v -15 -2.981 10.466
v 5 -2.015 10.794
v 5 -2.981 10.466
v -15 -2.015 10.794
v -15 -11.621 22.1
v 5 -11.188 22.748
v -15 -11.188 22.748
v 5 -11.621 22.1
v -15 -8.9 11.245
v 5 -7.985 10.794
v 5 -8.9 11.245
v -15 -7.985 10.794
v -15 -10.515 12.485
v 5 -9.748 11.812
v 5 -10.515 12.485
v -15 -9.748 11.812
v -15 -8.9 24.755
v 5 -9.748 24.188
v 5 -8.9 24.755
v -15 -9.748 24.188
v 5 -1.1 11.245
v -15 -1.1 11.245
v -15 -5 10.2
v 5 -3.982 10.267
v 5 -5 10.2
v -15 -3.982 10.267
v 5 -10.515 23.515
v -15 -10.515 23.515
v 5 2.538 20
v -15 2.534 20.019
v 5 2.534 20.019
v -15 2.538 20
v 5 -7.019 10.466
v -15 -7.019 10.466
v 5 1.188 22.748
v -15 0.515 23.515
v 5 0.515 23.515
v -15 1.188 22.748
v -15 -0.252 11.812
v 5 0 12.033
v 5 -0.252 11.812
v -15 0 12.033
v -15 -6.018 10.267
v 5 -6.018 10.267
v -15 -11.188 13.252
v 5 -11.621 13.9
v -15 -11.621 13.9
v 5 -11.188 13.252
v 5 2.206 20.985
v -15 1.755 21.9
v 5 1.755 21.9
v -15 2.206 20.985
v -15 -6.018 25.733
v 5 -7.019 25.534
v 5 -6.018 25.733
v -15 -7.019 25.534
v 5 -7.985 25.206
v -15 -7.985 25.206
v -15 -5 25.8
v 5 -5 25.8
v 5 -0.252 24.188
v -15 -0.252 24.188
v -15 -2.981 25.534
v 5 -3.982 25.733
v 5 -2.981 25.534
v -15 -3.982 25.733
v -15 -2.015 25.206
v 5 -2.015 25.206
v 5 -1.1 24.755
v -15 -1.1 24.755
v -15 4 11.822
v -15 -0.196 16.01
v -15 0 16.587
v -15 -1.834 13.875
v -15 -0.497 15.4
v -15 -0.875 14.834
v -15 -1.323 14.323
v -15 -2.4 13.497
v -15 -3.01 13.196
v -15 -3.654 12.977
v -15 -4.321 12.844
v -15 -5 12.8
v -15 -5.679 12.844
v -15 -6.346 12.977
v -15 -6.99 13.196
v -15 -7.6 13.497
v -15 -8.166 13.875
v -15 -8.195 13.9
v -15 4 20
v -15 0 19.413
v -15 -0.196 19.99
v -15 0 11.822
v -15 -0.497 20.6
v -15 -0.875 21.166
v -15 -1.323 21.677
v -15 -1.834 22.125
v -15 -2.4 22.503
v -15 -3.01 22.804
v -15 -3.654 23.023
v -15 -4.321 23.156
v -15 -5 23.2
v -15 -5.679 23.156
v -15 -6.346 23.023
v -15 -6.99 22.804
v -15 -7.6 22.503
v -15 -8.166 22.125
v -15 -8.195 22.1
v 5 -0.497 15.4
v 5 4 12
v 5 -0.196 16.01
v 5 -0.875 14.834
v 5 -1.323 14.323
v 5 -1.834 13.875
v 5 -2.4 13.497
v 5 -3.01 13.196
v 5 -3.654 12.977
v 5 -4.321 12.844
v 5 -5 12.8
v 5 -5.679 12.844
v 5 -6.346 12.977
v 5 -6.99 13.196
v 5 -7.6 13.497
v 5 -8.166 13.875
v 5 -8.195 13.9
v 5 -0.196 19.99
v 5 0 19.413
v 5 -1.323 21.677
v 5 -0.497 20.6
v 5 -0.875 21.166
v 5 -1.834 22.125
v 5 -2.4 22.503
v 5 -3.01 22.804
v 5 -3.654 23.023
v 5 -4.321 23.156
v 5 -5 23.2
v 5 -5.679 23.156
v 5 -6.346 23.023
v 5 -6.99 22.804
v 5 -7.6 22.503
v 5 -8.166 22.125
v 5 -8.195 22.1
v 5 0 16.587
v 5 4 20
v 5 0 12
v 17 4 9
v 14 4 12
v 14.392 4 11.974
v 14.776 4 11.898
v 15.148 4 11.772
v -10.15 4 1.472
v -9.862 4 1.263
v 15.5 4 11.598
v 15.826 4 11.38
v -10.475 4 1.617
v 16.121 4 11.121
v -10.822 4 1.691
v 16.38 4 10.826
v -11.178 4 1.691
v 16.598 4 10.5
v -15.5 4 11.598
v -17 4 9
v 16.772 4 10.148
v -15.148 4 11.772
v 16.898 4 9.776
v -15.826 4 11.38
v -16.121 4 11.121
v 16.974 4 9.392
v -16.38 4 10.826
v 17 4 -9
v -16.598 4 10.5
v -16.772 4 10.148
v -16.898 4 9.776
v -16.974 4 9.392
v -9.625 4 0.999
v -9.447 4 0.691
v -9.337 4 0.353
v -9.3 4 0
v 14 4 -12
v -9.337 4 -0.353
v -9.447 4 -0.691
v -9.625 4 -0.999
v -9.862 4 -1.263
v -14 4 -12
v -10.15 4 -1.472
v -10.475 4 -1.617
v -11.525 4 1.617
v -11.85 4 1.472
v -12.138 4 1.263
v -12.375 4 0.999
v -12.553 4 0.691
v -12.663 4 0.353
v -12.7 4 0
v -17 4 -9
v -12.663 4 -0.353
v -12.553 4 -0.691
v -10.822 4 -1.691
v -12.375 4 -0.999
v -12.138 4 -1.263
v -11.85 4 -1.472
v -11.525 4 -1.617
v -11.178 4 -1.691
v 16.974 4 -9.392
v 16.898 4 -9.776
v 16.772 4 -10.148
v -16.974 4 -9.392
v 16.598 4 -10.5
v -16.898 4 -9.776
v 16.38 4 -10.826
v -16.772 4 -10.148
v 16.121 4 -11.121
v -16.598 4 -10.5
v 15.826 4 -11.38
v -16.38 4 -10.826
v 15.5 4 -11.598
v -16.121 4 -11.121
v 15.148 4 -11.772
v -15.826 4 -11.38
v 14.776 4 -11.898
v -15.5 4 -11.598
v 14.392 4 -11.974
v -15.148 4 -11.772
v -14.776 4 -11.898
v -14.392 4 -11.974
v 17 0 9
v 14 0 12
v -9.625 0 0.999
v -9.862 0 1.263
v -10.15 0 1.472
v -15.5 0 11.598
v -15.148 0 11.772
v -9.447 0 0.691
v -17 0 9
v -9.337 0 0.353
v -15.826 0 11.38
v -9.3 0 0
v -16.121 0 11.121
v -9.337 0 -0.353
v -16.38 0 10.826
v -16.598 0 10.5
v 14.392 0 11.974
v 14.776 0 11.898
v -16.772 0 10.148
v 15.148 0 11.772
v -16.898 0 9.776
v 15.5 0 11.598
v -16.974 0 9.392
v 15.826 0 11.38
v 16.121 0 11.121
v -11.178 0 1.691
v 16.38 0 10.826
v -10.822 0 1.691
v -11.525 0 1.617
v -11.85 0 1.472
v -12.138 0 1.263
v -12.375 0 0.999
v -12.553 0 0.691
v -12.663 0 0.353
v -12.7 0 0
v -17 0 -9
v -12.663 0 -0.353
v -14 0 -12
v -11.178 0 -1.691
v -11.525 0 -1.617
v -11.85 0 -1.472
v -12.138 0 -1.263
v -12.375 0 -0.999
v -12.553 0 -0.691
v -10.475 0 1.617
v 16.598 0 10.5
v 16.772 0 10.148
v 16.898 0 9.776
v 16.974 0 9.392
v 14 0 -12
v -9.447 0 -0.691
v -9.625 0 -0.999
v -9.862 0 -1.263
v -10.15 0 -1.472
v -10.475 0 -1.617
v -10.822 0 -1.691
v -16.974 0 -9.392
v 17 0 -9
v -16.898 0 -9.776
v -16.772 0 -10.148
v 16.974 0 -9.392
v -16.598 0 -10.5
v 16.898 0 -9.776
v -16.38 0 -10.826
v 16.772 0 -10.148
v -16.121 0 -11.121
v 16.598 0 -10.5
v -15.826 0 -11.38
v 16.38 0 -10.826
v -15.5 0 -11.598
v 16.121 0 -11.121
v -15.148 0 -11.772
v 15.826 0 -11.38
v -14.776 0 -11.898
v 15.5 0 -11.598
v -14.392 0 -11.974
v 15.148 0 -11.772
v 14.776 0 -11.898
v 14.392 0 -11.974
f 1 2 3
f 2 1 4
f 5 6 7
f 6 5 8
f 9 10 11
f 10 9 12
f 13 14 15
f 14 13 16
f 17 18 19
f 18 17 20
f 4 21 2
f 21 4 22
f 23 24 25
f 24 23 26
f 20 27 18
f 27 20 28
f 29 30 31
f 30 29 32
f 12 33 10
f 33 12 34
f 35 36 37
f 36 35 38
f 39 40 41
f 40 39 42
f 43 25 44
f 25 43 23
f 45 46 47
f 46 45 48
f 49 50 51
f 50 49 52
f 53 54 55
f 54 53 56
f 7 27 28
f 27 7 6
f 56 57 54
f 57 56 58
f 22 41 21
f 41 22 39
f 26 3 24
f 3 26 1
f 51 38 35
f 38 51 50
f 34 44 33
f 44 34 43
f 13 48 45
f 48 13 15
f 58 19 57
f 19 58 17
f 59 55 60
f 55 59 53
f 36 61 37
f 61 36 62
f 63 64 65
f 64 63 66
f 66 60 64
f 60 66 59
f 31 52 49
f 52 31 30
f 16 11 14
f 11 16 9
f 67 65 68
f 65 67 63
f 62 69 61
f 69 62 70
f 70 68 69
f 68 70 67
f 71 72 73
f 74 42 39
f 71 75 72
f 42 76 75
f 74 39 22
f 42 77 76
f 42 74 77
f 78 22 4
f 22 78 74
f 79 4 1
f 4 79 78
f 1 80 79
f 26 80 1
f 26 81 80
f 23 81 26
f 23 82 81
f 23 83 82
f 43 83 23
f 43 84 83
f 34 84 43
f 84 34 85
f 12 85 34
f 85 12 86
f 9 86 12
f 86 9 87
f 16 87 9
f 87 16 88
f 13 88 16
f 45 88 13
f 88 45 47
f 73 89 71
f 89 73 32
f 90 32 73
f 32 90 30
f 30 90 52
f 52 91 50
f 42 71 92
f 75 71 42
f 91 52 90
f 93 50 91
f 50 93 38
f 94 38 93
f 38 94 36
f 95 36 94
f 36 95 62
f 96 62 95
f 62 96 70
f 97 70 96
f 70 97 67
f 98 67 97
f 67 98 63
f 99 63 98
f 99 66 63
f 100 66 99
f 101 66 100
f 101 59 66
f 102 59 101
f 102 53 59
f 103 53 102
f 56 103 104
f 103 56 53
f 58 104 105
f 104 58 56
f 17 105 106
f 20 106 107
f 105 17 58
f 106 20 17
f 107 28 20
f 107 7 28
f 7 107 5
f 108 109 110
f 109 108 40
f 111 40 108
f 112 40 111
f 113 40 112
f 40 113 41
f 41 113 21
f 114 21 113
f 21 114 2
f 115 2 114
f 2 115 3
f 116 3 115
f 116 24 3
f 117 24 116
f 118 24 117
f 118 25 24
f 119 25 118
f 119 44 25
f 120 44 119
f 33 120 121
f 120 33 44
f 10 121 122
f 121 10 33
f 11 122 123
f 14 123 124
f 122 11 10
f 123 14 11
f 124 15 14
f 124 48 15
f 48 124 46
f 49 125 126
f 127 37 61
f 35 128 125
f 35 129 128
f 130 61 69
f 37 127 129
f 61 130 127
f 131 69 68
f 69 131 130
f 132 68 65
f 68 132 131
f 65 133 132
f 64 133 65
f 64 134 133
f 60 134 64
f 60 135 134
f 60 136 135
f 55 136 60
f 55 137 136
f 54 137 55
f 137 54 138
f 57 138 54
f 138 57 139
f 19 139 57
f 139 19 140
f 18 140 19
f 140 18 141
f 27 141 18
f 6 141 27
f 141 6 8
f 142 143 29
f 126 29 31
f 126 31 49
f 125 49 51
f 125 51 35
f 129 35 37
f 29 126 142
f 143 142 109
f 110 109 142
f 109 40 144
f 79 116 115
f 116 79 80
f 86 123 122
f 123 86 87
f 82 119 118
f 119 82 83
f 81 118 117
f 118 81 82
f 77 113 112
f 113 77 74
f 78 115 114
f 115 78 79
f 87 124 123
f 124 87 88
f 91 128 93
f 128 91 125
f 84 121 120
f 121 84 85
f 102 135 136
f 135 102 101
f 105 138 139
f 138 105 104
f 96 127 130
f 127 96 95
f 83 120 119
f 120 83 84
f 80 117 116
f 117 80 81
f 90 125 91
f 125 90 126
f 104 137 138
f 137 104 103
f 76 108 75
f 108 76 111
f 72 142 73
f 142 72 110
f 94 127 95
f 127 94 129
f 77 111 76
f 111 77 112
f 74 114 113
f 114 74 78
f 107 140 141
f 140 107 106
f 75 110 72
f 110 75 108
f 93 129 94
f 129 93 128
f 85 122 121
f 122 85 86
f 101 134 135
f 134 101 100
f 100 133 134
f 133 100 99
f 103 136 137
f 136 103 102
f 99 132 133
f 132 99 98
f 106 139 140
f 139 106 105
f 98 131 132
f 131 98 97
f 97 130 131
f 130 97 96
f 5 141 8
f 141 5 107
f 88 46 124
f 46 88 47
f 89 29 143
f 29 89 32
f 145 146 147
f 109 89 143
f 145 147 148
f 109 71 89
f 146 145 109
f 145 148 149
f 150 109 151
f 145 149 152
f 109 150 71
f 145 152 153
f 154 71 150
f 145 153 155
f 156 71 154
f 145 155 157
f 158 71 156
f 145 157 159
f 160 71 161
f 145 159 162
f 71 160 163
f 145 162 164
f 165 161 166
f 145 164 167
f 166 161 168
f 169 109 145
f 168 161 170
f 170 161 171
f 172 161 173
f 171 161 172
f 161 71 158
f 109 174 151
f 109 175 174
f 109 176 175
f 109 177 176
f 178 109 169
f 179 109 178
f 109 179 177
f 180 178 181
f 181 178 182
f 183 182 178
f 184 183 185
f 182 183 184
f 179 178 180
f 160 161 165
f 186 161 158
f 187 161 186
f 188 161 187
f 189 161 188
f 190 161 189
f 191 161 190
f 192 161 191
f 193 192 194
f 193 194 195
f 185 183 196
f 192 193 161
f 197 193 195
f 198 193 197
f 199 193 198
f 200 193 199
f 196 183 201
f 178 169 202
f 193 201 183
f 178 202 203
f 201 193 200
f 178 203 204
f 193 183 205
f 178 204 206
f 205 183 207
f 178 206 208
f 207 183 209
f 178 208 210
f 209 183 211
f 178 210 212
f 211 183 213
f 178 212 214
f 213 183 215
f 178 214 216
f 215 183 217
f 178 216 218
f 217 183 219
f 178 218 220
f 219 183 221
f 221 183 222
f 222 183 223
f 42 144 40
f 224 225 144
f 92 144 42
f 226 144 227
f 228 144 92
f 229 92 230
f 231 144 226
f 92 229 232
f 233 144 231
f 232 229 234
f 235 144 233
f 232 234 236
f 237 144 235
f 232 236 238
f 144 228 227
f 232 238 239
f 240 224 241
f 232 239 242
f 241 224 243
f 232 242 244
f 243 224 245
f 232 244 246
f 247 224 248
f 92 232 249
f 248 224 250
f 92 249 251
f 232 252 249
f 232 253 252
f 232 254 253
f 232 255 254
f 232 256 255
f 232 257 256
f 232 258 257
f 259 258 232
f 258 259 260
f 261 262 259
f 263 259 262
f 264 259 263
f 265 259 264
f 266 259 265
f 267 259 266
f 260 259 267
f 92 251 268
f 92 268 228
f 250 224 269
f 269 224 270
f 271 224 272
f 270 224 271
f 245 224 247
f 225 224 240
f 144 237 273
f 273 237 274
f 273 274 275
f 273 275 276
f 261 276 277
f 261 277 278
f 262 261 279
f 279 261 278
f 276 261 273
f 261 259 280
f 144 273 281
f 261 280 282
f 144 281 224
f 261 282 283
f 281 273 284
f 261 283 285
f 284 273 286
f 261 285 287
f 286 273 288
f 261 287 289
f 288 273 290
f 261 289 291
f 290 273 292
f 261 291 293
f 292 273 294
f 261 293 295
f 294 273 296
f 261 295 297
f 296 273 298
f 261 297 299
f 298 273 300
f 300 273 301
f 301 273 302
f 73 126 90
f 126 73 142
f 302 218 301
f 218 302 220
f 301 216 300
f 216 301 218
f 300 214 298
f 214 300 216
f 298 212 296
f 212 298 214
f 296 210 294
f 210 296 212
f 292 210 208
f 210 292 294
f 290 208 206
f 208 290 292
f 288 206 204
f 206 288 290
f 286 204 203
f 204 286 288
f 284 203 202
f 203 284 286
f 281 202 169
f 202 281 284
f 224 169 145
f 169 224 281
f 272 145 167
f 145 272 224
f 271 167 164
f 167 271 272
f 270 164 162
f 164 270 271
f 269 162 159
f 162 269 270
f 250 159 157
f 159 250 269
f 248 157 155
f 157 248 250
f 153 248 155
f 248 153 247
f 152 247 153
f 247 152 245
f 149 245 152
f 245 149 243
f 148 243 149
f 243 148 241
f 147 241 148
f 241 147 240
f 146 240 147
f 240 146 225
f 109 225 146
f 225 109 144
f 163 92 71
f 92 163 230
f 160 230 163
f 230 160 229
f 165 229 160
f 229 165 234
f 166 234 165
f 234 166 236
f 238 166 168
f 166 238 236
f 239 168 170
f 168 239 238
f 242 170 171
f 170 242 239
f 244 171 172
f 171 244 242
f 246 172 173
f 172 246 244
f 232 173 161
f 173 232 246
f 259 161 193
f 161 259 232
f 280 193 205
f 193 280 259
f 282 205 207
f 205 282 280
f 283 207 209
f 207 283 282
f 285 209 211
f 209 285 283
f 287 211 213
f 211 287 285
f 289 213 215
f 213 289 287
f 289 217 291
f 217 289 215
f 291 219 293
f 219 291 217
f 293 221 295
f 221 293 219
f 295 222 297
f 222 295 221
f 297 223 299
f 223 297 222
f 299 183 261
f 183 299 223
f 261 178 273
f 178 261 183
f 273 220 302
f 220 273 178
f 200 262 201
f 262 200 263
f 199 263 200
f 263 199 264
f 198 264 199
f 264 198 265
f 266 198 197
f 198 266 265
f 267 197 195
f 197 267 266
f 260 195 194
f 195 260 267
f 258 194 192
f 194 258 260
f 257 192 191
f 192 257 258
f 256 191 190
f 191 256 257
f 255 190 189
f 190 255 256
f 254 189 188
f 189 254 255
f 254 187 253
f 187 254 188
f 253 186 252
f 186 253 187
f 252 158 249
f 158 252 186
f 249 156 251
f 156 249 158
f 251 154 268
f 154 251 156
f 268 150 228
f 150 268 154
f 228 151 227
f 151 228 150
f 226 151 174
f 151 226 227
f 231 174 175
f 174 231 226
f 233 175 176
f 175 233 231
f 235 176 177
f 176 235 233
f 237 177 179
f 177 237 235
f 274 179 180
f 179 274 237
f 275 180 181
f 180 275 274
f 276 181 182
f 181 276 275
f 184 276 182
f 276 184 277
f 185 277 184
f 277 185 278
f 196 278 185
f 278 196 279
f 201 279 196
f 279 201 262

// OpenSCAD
// file: tube_clip.scad
// HUB75 display frame - V1.2 V1.1-style tube clip
//
// Self-contained component.
// No project_config.scad dependency.
//
// Coordinate system:
// X = tube direction
// Y = front/rear
// Z = vertical
//
// The C-opening points away from the plate in -Y.

 /* [Clip] */
clip_length = 20.0;
clip_wall = 2.6;
clip_inner_diameter = 10.4;
clip_opening = 8.2;

 /* [Attachment] */
clip_plate_overlap = 1.4;
clip_vertical_overlap = 2.0;
attachment_thickness = 4.0;
attachment_plate_height = 24.0;

 /* [Standalone preview] */
preview_edge = "top"; // [top, bottom]
preview_center_x = 0.0;
preview_tube_z = 18.0;
preview_tube_y = -5.0;
preview_color = [0.86, 0.08, 0.05, 1];

 /* [Resolution] */
$fn = 48;


function clip_outer_diameter(
    inner_diameter,
    wall
) =
    inner_diameter + 2 * wall;


function clip_outer_radius(
    inner_diameter,
    wall
) =
    clip_outer_diameter(
        inner_diameter,
        wall
    ) / 2;


module tube_snap_clip(
    center_x = 0,
    local_tube_y = -5,
    local_tube_z = 18,
    length = clip_length,
    wall = clip_wall,
    inner_diameter = clip_inner_diameter,
    opening = clip_opening,
    part_color = preview_color
) {
    outer_d =
        clip_outer_diameter(
            inner_diameter,
            wall
        );

    outer_r =
        outer_d / 2;

    color(part_color)
        difference() {
            translate([
                center_x,
                local_tube_y,
                local_tube_z
            ])
                rotate([0, 90, 0])
                    cylinder(
                        h=length,
                        d=outer_d,
                        center=true,
                        $fn=48
                    );

            translate([
                center_x,
                local_tube_y,
                local_tube_z
            ])
                rotate([0, 90, 0])
                    cylinder(
                        h=length + 0.4,
                        d=inner_diameter,
                        center=true,
                        $fn=48
                    );

            // V1.1 orientation: opening away from the plate (-Y).
            translate([
                center_x - length/2 - 0.3,
                local_tube_y - outer_r - 0.6,
                local_tube_z - opening/2
            ])
                cube([
                    length + 0.6,
                    outer_r + 0.6,
                    opening
                ]);
        }
}


module tube_clip_extension(
    center_x = 0,
    edge = "top",
    local_tube_z = 18,
    length = clip_length,
    thickness = attachment_thickness,
    plate_height = attachment_plate_height,
    vertical_overlap = clip_vertical_overlap,
    part_color = preview_color
) {
    color(part_color)
        if(edge == "top")
            translate([
                center_x - length/2,
                0,
                plate_height/2 - thickness
            ])
                cube([
                    length,
                    thickness,
                    (local_tube_z + vertical_overlap)
                        - (plate_height/2 - thickness)
                ]);
        else
            translate([
                center_x - length/2,
                0,
                local_tube_z - vertical_overlap
            ])
                cube([
                    length,
                    thickness,
                    (-plate_height/2 + thickness)
                        - (local_tube_z - vertical_overlap)
                ]);
}


module tube_clip_with_extension(
    center_x = 0,
    edge = "top",
    local_tube_y = -5,
    local_tube_z = 18,
    length = clip_length,
    wall = clip_wall,
    inner_diameter = clip_inner_diameter,
    opening = clip_opening,
    thickness = attachment_thickness,
    plate_height = attachment_plate_height,
    vertical_overlap = clip_vertical_overlap,
    part_color = preview_color
) {
    union() {
        tube_snap_clip(
            center_x=center_x,
            local_tube_y=local_tube_y,
            local_tube_z=local_tube_z,
            length=length,
            wall=wall,
            inner_diameter=inner_diameter,
            opening=opening,
            part_color=part_color
        );

        tube_clip_extension(
            center_x=center_x,
            edge=edge,
            local_tube_z=local_tube_z,
            length=length,
            thickness=thickness,
            plate_height=plate_height,
            vertical_overlap=vertical_overlap,
            part_color=part_color
        );
    }
}


// Standalone preview
tube_clip_with_extension(
    center_x=preview_center_x,
    edge=preview_edge,
    local_tube_y=preview_tube_y,
    local_tube_z=preview_tube_z
);
// main file
// HUB75 display frame - V1.2 asymmetric end tube coupler
//
// Self-contained component.
// No project_config.scad dependency.
//
// Left and right versions are mirrored so the part stays inside the panel
// outline. The clip is shifted inward toward the display.

/* dependencies */
use <tube_clip.scad>

/* [Plate] */
plate_width = 34.0;
plate_height = 24.0;
plate_thickness = 4.0;
corner_radius = 3.0;

/* [Mounting] */
hole_diameter = 3.4;
outside_material = 6.0;

/* [Clip] */
clip_inward_offset = 6.0;
clip_length = 20.0;
clip_wall = 2.6;
clip_inner_diameter = 10.4;
clip_opening = 8.2;
clip_vertical_overlap = 2.0;

/* [Standalone preview] */
preview_side = "left"; // [left, right]
preview_direction = "top"; // [top, bottom]
preview_tube_y = -5.0;
preview_tube_z = 18.0;
preview_color = [0.82, 0.12, 0.05, 1];

/* [Resolution] */
$fn = 48;


module rounded_rectangle_2d(width, height, radius) {
    offset(r=radius)
        square(
            [width - 2*radius, height - 2*radius],
            center=true
        );
}


module end_tube_coupler(
    side = "left",
    direction = "top",
    width = plate_width,
    height = plate_height,
    thickness = plate_thickness,
    radius = corner_radius,
    hole_diameter_value = hole_diameter,
    outside_material_value = outside_material,
    clip_inward_offset_value = clip_inward_offset,
    local_tube_y = preview_tube_y,
    local_tube_z = preview_tube_z,
    clip_length_value = clip_length,
    clip_wall_value = clip_wall,
    clip_inner_diameter_value = clip_inner_diameter,
    clip_opening_value = clip_opening,
    clip_vertical_overlap_value = clip_vertical_overlap,
    part_color = preview_color
) {
    inward_sign =
        side == "left" ? 1 : -1;

    // Place the hole close to the outer edge, leaving the configured
    // material margin outside it.
    hole_x =
        side == "left"
            ? -width/2 + outside_material_value
            :  width/2 - outside_material_value;

    clip_x =
        hole_x
        + inward_sign * clip_inward_offset_value;

    color(part_color)
        translate([0, thickness, 0])
            rotate([90, 0, 0])
                linear_extrude(height=thickness)
                    difference() {
                        rounded_rectangle_2d(
                            width,
                            height,
                            radius
                        );

                        translate([hole_x, 0])
                            circle(
                                d=hole_diameter_value,
                                $fn=30
                            );
                    }

    tube_clip_with_extension(
        center_x=clip_x,
        edge=direction,
        local_tube_y=local_tube_y,
        local_tube_z=local_tube_z,
        length=clip_length_value,
        wall=clip_wall_value,
        inner_diameter=
            clip_inner_diameter_value,
        opening=clip_opening_value,
        thickness=thickness,
        plate_height=height,
        vertical_overlap=
            clip_vertical_overlap_value,
        part_color=part_color
    );
}


// Standalone preview
end_tube_coupler(
    side=preview_side,
    direction=preview_direction
);
